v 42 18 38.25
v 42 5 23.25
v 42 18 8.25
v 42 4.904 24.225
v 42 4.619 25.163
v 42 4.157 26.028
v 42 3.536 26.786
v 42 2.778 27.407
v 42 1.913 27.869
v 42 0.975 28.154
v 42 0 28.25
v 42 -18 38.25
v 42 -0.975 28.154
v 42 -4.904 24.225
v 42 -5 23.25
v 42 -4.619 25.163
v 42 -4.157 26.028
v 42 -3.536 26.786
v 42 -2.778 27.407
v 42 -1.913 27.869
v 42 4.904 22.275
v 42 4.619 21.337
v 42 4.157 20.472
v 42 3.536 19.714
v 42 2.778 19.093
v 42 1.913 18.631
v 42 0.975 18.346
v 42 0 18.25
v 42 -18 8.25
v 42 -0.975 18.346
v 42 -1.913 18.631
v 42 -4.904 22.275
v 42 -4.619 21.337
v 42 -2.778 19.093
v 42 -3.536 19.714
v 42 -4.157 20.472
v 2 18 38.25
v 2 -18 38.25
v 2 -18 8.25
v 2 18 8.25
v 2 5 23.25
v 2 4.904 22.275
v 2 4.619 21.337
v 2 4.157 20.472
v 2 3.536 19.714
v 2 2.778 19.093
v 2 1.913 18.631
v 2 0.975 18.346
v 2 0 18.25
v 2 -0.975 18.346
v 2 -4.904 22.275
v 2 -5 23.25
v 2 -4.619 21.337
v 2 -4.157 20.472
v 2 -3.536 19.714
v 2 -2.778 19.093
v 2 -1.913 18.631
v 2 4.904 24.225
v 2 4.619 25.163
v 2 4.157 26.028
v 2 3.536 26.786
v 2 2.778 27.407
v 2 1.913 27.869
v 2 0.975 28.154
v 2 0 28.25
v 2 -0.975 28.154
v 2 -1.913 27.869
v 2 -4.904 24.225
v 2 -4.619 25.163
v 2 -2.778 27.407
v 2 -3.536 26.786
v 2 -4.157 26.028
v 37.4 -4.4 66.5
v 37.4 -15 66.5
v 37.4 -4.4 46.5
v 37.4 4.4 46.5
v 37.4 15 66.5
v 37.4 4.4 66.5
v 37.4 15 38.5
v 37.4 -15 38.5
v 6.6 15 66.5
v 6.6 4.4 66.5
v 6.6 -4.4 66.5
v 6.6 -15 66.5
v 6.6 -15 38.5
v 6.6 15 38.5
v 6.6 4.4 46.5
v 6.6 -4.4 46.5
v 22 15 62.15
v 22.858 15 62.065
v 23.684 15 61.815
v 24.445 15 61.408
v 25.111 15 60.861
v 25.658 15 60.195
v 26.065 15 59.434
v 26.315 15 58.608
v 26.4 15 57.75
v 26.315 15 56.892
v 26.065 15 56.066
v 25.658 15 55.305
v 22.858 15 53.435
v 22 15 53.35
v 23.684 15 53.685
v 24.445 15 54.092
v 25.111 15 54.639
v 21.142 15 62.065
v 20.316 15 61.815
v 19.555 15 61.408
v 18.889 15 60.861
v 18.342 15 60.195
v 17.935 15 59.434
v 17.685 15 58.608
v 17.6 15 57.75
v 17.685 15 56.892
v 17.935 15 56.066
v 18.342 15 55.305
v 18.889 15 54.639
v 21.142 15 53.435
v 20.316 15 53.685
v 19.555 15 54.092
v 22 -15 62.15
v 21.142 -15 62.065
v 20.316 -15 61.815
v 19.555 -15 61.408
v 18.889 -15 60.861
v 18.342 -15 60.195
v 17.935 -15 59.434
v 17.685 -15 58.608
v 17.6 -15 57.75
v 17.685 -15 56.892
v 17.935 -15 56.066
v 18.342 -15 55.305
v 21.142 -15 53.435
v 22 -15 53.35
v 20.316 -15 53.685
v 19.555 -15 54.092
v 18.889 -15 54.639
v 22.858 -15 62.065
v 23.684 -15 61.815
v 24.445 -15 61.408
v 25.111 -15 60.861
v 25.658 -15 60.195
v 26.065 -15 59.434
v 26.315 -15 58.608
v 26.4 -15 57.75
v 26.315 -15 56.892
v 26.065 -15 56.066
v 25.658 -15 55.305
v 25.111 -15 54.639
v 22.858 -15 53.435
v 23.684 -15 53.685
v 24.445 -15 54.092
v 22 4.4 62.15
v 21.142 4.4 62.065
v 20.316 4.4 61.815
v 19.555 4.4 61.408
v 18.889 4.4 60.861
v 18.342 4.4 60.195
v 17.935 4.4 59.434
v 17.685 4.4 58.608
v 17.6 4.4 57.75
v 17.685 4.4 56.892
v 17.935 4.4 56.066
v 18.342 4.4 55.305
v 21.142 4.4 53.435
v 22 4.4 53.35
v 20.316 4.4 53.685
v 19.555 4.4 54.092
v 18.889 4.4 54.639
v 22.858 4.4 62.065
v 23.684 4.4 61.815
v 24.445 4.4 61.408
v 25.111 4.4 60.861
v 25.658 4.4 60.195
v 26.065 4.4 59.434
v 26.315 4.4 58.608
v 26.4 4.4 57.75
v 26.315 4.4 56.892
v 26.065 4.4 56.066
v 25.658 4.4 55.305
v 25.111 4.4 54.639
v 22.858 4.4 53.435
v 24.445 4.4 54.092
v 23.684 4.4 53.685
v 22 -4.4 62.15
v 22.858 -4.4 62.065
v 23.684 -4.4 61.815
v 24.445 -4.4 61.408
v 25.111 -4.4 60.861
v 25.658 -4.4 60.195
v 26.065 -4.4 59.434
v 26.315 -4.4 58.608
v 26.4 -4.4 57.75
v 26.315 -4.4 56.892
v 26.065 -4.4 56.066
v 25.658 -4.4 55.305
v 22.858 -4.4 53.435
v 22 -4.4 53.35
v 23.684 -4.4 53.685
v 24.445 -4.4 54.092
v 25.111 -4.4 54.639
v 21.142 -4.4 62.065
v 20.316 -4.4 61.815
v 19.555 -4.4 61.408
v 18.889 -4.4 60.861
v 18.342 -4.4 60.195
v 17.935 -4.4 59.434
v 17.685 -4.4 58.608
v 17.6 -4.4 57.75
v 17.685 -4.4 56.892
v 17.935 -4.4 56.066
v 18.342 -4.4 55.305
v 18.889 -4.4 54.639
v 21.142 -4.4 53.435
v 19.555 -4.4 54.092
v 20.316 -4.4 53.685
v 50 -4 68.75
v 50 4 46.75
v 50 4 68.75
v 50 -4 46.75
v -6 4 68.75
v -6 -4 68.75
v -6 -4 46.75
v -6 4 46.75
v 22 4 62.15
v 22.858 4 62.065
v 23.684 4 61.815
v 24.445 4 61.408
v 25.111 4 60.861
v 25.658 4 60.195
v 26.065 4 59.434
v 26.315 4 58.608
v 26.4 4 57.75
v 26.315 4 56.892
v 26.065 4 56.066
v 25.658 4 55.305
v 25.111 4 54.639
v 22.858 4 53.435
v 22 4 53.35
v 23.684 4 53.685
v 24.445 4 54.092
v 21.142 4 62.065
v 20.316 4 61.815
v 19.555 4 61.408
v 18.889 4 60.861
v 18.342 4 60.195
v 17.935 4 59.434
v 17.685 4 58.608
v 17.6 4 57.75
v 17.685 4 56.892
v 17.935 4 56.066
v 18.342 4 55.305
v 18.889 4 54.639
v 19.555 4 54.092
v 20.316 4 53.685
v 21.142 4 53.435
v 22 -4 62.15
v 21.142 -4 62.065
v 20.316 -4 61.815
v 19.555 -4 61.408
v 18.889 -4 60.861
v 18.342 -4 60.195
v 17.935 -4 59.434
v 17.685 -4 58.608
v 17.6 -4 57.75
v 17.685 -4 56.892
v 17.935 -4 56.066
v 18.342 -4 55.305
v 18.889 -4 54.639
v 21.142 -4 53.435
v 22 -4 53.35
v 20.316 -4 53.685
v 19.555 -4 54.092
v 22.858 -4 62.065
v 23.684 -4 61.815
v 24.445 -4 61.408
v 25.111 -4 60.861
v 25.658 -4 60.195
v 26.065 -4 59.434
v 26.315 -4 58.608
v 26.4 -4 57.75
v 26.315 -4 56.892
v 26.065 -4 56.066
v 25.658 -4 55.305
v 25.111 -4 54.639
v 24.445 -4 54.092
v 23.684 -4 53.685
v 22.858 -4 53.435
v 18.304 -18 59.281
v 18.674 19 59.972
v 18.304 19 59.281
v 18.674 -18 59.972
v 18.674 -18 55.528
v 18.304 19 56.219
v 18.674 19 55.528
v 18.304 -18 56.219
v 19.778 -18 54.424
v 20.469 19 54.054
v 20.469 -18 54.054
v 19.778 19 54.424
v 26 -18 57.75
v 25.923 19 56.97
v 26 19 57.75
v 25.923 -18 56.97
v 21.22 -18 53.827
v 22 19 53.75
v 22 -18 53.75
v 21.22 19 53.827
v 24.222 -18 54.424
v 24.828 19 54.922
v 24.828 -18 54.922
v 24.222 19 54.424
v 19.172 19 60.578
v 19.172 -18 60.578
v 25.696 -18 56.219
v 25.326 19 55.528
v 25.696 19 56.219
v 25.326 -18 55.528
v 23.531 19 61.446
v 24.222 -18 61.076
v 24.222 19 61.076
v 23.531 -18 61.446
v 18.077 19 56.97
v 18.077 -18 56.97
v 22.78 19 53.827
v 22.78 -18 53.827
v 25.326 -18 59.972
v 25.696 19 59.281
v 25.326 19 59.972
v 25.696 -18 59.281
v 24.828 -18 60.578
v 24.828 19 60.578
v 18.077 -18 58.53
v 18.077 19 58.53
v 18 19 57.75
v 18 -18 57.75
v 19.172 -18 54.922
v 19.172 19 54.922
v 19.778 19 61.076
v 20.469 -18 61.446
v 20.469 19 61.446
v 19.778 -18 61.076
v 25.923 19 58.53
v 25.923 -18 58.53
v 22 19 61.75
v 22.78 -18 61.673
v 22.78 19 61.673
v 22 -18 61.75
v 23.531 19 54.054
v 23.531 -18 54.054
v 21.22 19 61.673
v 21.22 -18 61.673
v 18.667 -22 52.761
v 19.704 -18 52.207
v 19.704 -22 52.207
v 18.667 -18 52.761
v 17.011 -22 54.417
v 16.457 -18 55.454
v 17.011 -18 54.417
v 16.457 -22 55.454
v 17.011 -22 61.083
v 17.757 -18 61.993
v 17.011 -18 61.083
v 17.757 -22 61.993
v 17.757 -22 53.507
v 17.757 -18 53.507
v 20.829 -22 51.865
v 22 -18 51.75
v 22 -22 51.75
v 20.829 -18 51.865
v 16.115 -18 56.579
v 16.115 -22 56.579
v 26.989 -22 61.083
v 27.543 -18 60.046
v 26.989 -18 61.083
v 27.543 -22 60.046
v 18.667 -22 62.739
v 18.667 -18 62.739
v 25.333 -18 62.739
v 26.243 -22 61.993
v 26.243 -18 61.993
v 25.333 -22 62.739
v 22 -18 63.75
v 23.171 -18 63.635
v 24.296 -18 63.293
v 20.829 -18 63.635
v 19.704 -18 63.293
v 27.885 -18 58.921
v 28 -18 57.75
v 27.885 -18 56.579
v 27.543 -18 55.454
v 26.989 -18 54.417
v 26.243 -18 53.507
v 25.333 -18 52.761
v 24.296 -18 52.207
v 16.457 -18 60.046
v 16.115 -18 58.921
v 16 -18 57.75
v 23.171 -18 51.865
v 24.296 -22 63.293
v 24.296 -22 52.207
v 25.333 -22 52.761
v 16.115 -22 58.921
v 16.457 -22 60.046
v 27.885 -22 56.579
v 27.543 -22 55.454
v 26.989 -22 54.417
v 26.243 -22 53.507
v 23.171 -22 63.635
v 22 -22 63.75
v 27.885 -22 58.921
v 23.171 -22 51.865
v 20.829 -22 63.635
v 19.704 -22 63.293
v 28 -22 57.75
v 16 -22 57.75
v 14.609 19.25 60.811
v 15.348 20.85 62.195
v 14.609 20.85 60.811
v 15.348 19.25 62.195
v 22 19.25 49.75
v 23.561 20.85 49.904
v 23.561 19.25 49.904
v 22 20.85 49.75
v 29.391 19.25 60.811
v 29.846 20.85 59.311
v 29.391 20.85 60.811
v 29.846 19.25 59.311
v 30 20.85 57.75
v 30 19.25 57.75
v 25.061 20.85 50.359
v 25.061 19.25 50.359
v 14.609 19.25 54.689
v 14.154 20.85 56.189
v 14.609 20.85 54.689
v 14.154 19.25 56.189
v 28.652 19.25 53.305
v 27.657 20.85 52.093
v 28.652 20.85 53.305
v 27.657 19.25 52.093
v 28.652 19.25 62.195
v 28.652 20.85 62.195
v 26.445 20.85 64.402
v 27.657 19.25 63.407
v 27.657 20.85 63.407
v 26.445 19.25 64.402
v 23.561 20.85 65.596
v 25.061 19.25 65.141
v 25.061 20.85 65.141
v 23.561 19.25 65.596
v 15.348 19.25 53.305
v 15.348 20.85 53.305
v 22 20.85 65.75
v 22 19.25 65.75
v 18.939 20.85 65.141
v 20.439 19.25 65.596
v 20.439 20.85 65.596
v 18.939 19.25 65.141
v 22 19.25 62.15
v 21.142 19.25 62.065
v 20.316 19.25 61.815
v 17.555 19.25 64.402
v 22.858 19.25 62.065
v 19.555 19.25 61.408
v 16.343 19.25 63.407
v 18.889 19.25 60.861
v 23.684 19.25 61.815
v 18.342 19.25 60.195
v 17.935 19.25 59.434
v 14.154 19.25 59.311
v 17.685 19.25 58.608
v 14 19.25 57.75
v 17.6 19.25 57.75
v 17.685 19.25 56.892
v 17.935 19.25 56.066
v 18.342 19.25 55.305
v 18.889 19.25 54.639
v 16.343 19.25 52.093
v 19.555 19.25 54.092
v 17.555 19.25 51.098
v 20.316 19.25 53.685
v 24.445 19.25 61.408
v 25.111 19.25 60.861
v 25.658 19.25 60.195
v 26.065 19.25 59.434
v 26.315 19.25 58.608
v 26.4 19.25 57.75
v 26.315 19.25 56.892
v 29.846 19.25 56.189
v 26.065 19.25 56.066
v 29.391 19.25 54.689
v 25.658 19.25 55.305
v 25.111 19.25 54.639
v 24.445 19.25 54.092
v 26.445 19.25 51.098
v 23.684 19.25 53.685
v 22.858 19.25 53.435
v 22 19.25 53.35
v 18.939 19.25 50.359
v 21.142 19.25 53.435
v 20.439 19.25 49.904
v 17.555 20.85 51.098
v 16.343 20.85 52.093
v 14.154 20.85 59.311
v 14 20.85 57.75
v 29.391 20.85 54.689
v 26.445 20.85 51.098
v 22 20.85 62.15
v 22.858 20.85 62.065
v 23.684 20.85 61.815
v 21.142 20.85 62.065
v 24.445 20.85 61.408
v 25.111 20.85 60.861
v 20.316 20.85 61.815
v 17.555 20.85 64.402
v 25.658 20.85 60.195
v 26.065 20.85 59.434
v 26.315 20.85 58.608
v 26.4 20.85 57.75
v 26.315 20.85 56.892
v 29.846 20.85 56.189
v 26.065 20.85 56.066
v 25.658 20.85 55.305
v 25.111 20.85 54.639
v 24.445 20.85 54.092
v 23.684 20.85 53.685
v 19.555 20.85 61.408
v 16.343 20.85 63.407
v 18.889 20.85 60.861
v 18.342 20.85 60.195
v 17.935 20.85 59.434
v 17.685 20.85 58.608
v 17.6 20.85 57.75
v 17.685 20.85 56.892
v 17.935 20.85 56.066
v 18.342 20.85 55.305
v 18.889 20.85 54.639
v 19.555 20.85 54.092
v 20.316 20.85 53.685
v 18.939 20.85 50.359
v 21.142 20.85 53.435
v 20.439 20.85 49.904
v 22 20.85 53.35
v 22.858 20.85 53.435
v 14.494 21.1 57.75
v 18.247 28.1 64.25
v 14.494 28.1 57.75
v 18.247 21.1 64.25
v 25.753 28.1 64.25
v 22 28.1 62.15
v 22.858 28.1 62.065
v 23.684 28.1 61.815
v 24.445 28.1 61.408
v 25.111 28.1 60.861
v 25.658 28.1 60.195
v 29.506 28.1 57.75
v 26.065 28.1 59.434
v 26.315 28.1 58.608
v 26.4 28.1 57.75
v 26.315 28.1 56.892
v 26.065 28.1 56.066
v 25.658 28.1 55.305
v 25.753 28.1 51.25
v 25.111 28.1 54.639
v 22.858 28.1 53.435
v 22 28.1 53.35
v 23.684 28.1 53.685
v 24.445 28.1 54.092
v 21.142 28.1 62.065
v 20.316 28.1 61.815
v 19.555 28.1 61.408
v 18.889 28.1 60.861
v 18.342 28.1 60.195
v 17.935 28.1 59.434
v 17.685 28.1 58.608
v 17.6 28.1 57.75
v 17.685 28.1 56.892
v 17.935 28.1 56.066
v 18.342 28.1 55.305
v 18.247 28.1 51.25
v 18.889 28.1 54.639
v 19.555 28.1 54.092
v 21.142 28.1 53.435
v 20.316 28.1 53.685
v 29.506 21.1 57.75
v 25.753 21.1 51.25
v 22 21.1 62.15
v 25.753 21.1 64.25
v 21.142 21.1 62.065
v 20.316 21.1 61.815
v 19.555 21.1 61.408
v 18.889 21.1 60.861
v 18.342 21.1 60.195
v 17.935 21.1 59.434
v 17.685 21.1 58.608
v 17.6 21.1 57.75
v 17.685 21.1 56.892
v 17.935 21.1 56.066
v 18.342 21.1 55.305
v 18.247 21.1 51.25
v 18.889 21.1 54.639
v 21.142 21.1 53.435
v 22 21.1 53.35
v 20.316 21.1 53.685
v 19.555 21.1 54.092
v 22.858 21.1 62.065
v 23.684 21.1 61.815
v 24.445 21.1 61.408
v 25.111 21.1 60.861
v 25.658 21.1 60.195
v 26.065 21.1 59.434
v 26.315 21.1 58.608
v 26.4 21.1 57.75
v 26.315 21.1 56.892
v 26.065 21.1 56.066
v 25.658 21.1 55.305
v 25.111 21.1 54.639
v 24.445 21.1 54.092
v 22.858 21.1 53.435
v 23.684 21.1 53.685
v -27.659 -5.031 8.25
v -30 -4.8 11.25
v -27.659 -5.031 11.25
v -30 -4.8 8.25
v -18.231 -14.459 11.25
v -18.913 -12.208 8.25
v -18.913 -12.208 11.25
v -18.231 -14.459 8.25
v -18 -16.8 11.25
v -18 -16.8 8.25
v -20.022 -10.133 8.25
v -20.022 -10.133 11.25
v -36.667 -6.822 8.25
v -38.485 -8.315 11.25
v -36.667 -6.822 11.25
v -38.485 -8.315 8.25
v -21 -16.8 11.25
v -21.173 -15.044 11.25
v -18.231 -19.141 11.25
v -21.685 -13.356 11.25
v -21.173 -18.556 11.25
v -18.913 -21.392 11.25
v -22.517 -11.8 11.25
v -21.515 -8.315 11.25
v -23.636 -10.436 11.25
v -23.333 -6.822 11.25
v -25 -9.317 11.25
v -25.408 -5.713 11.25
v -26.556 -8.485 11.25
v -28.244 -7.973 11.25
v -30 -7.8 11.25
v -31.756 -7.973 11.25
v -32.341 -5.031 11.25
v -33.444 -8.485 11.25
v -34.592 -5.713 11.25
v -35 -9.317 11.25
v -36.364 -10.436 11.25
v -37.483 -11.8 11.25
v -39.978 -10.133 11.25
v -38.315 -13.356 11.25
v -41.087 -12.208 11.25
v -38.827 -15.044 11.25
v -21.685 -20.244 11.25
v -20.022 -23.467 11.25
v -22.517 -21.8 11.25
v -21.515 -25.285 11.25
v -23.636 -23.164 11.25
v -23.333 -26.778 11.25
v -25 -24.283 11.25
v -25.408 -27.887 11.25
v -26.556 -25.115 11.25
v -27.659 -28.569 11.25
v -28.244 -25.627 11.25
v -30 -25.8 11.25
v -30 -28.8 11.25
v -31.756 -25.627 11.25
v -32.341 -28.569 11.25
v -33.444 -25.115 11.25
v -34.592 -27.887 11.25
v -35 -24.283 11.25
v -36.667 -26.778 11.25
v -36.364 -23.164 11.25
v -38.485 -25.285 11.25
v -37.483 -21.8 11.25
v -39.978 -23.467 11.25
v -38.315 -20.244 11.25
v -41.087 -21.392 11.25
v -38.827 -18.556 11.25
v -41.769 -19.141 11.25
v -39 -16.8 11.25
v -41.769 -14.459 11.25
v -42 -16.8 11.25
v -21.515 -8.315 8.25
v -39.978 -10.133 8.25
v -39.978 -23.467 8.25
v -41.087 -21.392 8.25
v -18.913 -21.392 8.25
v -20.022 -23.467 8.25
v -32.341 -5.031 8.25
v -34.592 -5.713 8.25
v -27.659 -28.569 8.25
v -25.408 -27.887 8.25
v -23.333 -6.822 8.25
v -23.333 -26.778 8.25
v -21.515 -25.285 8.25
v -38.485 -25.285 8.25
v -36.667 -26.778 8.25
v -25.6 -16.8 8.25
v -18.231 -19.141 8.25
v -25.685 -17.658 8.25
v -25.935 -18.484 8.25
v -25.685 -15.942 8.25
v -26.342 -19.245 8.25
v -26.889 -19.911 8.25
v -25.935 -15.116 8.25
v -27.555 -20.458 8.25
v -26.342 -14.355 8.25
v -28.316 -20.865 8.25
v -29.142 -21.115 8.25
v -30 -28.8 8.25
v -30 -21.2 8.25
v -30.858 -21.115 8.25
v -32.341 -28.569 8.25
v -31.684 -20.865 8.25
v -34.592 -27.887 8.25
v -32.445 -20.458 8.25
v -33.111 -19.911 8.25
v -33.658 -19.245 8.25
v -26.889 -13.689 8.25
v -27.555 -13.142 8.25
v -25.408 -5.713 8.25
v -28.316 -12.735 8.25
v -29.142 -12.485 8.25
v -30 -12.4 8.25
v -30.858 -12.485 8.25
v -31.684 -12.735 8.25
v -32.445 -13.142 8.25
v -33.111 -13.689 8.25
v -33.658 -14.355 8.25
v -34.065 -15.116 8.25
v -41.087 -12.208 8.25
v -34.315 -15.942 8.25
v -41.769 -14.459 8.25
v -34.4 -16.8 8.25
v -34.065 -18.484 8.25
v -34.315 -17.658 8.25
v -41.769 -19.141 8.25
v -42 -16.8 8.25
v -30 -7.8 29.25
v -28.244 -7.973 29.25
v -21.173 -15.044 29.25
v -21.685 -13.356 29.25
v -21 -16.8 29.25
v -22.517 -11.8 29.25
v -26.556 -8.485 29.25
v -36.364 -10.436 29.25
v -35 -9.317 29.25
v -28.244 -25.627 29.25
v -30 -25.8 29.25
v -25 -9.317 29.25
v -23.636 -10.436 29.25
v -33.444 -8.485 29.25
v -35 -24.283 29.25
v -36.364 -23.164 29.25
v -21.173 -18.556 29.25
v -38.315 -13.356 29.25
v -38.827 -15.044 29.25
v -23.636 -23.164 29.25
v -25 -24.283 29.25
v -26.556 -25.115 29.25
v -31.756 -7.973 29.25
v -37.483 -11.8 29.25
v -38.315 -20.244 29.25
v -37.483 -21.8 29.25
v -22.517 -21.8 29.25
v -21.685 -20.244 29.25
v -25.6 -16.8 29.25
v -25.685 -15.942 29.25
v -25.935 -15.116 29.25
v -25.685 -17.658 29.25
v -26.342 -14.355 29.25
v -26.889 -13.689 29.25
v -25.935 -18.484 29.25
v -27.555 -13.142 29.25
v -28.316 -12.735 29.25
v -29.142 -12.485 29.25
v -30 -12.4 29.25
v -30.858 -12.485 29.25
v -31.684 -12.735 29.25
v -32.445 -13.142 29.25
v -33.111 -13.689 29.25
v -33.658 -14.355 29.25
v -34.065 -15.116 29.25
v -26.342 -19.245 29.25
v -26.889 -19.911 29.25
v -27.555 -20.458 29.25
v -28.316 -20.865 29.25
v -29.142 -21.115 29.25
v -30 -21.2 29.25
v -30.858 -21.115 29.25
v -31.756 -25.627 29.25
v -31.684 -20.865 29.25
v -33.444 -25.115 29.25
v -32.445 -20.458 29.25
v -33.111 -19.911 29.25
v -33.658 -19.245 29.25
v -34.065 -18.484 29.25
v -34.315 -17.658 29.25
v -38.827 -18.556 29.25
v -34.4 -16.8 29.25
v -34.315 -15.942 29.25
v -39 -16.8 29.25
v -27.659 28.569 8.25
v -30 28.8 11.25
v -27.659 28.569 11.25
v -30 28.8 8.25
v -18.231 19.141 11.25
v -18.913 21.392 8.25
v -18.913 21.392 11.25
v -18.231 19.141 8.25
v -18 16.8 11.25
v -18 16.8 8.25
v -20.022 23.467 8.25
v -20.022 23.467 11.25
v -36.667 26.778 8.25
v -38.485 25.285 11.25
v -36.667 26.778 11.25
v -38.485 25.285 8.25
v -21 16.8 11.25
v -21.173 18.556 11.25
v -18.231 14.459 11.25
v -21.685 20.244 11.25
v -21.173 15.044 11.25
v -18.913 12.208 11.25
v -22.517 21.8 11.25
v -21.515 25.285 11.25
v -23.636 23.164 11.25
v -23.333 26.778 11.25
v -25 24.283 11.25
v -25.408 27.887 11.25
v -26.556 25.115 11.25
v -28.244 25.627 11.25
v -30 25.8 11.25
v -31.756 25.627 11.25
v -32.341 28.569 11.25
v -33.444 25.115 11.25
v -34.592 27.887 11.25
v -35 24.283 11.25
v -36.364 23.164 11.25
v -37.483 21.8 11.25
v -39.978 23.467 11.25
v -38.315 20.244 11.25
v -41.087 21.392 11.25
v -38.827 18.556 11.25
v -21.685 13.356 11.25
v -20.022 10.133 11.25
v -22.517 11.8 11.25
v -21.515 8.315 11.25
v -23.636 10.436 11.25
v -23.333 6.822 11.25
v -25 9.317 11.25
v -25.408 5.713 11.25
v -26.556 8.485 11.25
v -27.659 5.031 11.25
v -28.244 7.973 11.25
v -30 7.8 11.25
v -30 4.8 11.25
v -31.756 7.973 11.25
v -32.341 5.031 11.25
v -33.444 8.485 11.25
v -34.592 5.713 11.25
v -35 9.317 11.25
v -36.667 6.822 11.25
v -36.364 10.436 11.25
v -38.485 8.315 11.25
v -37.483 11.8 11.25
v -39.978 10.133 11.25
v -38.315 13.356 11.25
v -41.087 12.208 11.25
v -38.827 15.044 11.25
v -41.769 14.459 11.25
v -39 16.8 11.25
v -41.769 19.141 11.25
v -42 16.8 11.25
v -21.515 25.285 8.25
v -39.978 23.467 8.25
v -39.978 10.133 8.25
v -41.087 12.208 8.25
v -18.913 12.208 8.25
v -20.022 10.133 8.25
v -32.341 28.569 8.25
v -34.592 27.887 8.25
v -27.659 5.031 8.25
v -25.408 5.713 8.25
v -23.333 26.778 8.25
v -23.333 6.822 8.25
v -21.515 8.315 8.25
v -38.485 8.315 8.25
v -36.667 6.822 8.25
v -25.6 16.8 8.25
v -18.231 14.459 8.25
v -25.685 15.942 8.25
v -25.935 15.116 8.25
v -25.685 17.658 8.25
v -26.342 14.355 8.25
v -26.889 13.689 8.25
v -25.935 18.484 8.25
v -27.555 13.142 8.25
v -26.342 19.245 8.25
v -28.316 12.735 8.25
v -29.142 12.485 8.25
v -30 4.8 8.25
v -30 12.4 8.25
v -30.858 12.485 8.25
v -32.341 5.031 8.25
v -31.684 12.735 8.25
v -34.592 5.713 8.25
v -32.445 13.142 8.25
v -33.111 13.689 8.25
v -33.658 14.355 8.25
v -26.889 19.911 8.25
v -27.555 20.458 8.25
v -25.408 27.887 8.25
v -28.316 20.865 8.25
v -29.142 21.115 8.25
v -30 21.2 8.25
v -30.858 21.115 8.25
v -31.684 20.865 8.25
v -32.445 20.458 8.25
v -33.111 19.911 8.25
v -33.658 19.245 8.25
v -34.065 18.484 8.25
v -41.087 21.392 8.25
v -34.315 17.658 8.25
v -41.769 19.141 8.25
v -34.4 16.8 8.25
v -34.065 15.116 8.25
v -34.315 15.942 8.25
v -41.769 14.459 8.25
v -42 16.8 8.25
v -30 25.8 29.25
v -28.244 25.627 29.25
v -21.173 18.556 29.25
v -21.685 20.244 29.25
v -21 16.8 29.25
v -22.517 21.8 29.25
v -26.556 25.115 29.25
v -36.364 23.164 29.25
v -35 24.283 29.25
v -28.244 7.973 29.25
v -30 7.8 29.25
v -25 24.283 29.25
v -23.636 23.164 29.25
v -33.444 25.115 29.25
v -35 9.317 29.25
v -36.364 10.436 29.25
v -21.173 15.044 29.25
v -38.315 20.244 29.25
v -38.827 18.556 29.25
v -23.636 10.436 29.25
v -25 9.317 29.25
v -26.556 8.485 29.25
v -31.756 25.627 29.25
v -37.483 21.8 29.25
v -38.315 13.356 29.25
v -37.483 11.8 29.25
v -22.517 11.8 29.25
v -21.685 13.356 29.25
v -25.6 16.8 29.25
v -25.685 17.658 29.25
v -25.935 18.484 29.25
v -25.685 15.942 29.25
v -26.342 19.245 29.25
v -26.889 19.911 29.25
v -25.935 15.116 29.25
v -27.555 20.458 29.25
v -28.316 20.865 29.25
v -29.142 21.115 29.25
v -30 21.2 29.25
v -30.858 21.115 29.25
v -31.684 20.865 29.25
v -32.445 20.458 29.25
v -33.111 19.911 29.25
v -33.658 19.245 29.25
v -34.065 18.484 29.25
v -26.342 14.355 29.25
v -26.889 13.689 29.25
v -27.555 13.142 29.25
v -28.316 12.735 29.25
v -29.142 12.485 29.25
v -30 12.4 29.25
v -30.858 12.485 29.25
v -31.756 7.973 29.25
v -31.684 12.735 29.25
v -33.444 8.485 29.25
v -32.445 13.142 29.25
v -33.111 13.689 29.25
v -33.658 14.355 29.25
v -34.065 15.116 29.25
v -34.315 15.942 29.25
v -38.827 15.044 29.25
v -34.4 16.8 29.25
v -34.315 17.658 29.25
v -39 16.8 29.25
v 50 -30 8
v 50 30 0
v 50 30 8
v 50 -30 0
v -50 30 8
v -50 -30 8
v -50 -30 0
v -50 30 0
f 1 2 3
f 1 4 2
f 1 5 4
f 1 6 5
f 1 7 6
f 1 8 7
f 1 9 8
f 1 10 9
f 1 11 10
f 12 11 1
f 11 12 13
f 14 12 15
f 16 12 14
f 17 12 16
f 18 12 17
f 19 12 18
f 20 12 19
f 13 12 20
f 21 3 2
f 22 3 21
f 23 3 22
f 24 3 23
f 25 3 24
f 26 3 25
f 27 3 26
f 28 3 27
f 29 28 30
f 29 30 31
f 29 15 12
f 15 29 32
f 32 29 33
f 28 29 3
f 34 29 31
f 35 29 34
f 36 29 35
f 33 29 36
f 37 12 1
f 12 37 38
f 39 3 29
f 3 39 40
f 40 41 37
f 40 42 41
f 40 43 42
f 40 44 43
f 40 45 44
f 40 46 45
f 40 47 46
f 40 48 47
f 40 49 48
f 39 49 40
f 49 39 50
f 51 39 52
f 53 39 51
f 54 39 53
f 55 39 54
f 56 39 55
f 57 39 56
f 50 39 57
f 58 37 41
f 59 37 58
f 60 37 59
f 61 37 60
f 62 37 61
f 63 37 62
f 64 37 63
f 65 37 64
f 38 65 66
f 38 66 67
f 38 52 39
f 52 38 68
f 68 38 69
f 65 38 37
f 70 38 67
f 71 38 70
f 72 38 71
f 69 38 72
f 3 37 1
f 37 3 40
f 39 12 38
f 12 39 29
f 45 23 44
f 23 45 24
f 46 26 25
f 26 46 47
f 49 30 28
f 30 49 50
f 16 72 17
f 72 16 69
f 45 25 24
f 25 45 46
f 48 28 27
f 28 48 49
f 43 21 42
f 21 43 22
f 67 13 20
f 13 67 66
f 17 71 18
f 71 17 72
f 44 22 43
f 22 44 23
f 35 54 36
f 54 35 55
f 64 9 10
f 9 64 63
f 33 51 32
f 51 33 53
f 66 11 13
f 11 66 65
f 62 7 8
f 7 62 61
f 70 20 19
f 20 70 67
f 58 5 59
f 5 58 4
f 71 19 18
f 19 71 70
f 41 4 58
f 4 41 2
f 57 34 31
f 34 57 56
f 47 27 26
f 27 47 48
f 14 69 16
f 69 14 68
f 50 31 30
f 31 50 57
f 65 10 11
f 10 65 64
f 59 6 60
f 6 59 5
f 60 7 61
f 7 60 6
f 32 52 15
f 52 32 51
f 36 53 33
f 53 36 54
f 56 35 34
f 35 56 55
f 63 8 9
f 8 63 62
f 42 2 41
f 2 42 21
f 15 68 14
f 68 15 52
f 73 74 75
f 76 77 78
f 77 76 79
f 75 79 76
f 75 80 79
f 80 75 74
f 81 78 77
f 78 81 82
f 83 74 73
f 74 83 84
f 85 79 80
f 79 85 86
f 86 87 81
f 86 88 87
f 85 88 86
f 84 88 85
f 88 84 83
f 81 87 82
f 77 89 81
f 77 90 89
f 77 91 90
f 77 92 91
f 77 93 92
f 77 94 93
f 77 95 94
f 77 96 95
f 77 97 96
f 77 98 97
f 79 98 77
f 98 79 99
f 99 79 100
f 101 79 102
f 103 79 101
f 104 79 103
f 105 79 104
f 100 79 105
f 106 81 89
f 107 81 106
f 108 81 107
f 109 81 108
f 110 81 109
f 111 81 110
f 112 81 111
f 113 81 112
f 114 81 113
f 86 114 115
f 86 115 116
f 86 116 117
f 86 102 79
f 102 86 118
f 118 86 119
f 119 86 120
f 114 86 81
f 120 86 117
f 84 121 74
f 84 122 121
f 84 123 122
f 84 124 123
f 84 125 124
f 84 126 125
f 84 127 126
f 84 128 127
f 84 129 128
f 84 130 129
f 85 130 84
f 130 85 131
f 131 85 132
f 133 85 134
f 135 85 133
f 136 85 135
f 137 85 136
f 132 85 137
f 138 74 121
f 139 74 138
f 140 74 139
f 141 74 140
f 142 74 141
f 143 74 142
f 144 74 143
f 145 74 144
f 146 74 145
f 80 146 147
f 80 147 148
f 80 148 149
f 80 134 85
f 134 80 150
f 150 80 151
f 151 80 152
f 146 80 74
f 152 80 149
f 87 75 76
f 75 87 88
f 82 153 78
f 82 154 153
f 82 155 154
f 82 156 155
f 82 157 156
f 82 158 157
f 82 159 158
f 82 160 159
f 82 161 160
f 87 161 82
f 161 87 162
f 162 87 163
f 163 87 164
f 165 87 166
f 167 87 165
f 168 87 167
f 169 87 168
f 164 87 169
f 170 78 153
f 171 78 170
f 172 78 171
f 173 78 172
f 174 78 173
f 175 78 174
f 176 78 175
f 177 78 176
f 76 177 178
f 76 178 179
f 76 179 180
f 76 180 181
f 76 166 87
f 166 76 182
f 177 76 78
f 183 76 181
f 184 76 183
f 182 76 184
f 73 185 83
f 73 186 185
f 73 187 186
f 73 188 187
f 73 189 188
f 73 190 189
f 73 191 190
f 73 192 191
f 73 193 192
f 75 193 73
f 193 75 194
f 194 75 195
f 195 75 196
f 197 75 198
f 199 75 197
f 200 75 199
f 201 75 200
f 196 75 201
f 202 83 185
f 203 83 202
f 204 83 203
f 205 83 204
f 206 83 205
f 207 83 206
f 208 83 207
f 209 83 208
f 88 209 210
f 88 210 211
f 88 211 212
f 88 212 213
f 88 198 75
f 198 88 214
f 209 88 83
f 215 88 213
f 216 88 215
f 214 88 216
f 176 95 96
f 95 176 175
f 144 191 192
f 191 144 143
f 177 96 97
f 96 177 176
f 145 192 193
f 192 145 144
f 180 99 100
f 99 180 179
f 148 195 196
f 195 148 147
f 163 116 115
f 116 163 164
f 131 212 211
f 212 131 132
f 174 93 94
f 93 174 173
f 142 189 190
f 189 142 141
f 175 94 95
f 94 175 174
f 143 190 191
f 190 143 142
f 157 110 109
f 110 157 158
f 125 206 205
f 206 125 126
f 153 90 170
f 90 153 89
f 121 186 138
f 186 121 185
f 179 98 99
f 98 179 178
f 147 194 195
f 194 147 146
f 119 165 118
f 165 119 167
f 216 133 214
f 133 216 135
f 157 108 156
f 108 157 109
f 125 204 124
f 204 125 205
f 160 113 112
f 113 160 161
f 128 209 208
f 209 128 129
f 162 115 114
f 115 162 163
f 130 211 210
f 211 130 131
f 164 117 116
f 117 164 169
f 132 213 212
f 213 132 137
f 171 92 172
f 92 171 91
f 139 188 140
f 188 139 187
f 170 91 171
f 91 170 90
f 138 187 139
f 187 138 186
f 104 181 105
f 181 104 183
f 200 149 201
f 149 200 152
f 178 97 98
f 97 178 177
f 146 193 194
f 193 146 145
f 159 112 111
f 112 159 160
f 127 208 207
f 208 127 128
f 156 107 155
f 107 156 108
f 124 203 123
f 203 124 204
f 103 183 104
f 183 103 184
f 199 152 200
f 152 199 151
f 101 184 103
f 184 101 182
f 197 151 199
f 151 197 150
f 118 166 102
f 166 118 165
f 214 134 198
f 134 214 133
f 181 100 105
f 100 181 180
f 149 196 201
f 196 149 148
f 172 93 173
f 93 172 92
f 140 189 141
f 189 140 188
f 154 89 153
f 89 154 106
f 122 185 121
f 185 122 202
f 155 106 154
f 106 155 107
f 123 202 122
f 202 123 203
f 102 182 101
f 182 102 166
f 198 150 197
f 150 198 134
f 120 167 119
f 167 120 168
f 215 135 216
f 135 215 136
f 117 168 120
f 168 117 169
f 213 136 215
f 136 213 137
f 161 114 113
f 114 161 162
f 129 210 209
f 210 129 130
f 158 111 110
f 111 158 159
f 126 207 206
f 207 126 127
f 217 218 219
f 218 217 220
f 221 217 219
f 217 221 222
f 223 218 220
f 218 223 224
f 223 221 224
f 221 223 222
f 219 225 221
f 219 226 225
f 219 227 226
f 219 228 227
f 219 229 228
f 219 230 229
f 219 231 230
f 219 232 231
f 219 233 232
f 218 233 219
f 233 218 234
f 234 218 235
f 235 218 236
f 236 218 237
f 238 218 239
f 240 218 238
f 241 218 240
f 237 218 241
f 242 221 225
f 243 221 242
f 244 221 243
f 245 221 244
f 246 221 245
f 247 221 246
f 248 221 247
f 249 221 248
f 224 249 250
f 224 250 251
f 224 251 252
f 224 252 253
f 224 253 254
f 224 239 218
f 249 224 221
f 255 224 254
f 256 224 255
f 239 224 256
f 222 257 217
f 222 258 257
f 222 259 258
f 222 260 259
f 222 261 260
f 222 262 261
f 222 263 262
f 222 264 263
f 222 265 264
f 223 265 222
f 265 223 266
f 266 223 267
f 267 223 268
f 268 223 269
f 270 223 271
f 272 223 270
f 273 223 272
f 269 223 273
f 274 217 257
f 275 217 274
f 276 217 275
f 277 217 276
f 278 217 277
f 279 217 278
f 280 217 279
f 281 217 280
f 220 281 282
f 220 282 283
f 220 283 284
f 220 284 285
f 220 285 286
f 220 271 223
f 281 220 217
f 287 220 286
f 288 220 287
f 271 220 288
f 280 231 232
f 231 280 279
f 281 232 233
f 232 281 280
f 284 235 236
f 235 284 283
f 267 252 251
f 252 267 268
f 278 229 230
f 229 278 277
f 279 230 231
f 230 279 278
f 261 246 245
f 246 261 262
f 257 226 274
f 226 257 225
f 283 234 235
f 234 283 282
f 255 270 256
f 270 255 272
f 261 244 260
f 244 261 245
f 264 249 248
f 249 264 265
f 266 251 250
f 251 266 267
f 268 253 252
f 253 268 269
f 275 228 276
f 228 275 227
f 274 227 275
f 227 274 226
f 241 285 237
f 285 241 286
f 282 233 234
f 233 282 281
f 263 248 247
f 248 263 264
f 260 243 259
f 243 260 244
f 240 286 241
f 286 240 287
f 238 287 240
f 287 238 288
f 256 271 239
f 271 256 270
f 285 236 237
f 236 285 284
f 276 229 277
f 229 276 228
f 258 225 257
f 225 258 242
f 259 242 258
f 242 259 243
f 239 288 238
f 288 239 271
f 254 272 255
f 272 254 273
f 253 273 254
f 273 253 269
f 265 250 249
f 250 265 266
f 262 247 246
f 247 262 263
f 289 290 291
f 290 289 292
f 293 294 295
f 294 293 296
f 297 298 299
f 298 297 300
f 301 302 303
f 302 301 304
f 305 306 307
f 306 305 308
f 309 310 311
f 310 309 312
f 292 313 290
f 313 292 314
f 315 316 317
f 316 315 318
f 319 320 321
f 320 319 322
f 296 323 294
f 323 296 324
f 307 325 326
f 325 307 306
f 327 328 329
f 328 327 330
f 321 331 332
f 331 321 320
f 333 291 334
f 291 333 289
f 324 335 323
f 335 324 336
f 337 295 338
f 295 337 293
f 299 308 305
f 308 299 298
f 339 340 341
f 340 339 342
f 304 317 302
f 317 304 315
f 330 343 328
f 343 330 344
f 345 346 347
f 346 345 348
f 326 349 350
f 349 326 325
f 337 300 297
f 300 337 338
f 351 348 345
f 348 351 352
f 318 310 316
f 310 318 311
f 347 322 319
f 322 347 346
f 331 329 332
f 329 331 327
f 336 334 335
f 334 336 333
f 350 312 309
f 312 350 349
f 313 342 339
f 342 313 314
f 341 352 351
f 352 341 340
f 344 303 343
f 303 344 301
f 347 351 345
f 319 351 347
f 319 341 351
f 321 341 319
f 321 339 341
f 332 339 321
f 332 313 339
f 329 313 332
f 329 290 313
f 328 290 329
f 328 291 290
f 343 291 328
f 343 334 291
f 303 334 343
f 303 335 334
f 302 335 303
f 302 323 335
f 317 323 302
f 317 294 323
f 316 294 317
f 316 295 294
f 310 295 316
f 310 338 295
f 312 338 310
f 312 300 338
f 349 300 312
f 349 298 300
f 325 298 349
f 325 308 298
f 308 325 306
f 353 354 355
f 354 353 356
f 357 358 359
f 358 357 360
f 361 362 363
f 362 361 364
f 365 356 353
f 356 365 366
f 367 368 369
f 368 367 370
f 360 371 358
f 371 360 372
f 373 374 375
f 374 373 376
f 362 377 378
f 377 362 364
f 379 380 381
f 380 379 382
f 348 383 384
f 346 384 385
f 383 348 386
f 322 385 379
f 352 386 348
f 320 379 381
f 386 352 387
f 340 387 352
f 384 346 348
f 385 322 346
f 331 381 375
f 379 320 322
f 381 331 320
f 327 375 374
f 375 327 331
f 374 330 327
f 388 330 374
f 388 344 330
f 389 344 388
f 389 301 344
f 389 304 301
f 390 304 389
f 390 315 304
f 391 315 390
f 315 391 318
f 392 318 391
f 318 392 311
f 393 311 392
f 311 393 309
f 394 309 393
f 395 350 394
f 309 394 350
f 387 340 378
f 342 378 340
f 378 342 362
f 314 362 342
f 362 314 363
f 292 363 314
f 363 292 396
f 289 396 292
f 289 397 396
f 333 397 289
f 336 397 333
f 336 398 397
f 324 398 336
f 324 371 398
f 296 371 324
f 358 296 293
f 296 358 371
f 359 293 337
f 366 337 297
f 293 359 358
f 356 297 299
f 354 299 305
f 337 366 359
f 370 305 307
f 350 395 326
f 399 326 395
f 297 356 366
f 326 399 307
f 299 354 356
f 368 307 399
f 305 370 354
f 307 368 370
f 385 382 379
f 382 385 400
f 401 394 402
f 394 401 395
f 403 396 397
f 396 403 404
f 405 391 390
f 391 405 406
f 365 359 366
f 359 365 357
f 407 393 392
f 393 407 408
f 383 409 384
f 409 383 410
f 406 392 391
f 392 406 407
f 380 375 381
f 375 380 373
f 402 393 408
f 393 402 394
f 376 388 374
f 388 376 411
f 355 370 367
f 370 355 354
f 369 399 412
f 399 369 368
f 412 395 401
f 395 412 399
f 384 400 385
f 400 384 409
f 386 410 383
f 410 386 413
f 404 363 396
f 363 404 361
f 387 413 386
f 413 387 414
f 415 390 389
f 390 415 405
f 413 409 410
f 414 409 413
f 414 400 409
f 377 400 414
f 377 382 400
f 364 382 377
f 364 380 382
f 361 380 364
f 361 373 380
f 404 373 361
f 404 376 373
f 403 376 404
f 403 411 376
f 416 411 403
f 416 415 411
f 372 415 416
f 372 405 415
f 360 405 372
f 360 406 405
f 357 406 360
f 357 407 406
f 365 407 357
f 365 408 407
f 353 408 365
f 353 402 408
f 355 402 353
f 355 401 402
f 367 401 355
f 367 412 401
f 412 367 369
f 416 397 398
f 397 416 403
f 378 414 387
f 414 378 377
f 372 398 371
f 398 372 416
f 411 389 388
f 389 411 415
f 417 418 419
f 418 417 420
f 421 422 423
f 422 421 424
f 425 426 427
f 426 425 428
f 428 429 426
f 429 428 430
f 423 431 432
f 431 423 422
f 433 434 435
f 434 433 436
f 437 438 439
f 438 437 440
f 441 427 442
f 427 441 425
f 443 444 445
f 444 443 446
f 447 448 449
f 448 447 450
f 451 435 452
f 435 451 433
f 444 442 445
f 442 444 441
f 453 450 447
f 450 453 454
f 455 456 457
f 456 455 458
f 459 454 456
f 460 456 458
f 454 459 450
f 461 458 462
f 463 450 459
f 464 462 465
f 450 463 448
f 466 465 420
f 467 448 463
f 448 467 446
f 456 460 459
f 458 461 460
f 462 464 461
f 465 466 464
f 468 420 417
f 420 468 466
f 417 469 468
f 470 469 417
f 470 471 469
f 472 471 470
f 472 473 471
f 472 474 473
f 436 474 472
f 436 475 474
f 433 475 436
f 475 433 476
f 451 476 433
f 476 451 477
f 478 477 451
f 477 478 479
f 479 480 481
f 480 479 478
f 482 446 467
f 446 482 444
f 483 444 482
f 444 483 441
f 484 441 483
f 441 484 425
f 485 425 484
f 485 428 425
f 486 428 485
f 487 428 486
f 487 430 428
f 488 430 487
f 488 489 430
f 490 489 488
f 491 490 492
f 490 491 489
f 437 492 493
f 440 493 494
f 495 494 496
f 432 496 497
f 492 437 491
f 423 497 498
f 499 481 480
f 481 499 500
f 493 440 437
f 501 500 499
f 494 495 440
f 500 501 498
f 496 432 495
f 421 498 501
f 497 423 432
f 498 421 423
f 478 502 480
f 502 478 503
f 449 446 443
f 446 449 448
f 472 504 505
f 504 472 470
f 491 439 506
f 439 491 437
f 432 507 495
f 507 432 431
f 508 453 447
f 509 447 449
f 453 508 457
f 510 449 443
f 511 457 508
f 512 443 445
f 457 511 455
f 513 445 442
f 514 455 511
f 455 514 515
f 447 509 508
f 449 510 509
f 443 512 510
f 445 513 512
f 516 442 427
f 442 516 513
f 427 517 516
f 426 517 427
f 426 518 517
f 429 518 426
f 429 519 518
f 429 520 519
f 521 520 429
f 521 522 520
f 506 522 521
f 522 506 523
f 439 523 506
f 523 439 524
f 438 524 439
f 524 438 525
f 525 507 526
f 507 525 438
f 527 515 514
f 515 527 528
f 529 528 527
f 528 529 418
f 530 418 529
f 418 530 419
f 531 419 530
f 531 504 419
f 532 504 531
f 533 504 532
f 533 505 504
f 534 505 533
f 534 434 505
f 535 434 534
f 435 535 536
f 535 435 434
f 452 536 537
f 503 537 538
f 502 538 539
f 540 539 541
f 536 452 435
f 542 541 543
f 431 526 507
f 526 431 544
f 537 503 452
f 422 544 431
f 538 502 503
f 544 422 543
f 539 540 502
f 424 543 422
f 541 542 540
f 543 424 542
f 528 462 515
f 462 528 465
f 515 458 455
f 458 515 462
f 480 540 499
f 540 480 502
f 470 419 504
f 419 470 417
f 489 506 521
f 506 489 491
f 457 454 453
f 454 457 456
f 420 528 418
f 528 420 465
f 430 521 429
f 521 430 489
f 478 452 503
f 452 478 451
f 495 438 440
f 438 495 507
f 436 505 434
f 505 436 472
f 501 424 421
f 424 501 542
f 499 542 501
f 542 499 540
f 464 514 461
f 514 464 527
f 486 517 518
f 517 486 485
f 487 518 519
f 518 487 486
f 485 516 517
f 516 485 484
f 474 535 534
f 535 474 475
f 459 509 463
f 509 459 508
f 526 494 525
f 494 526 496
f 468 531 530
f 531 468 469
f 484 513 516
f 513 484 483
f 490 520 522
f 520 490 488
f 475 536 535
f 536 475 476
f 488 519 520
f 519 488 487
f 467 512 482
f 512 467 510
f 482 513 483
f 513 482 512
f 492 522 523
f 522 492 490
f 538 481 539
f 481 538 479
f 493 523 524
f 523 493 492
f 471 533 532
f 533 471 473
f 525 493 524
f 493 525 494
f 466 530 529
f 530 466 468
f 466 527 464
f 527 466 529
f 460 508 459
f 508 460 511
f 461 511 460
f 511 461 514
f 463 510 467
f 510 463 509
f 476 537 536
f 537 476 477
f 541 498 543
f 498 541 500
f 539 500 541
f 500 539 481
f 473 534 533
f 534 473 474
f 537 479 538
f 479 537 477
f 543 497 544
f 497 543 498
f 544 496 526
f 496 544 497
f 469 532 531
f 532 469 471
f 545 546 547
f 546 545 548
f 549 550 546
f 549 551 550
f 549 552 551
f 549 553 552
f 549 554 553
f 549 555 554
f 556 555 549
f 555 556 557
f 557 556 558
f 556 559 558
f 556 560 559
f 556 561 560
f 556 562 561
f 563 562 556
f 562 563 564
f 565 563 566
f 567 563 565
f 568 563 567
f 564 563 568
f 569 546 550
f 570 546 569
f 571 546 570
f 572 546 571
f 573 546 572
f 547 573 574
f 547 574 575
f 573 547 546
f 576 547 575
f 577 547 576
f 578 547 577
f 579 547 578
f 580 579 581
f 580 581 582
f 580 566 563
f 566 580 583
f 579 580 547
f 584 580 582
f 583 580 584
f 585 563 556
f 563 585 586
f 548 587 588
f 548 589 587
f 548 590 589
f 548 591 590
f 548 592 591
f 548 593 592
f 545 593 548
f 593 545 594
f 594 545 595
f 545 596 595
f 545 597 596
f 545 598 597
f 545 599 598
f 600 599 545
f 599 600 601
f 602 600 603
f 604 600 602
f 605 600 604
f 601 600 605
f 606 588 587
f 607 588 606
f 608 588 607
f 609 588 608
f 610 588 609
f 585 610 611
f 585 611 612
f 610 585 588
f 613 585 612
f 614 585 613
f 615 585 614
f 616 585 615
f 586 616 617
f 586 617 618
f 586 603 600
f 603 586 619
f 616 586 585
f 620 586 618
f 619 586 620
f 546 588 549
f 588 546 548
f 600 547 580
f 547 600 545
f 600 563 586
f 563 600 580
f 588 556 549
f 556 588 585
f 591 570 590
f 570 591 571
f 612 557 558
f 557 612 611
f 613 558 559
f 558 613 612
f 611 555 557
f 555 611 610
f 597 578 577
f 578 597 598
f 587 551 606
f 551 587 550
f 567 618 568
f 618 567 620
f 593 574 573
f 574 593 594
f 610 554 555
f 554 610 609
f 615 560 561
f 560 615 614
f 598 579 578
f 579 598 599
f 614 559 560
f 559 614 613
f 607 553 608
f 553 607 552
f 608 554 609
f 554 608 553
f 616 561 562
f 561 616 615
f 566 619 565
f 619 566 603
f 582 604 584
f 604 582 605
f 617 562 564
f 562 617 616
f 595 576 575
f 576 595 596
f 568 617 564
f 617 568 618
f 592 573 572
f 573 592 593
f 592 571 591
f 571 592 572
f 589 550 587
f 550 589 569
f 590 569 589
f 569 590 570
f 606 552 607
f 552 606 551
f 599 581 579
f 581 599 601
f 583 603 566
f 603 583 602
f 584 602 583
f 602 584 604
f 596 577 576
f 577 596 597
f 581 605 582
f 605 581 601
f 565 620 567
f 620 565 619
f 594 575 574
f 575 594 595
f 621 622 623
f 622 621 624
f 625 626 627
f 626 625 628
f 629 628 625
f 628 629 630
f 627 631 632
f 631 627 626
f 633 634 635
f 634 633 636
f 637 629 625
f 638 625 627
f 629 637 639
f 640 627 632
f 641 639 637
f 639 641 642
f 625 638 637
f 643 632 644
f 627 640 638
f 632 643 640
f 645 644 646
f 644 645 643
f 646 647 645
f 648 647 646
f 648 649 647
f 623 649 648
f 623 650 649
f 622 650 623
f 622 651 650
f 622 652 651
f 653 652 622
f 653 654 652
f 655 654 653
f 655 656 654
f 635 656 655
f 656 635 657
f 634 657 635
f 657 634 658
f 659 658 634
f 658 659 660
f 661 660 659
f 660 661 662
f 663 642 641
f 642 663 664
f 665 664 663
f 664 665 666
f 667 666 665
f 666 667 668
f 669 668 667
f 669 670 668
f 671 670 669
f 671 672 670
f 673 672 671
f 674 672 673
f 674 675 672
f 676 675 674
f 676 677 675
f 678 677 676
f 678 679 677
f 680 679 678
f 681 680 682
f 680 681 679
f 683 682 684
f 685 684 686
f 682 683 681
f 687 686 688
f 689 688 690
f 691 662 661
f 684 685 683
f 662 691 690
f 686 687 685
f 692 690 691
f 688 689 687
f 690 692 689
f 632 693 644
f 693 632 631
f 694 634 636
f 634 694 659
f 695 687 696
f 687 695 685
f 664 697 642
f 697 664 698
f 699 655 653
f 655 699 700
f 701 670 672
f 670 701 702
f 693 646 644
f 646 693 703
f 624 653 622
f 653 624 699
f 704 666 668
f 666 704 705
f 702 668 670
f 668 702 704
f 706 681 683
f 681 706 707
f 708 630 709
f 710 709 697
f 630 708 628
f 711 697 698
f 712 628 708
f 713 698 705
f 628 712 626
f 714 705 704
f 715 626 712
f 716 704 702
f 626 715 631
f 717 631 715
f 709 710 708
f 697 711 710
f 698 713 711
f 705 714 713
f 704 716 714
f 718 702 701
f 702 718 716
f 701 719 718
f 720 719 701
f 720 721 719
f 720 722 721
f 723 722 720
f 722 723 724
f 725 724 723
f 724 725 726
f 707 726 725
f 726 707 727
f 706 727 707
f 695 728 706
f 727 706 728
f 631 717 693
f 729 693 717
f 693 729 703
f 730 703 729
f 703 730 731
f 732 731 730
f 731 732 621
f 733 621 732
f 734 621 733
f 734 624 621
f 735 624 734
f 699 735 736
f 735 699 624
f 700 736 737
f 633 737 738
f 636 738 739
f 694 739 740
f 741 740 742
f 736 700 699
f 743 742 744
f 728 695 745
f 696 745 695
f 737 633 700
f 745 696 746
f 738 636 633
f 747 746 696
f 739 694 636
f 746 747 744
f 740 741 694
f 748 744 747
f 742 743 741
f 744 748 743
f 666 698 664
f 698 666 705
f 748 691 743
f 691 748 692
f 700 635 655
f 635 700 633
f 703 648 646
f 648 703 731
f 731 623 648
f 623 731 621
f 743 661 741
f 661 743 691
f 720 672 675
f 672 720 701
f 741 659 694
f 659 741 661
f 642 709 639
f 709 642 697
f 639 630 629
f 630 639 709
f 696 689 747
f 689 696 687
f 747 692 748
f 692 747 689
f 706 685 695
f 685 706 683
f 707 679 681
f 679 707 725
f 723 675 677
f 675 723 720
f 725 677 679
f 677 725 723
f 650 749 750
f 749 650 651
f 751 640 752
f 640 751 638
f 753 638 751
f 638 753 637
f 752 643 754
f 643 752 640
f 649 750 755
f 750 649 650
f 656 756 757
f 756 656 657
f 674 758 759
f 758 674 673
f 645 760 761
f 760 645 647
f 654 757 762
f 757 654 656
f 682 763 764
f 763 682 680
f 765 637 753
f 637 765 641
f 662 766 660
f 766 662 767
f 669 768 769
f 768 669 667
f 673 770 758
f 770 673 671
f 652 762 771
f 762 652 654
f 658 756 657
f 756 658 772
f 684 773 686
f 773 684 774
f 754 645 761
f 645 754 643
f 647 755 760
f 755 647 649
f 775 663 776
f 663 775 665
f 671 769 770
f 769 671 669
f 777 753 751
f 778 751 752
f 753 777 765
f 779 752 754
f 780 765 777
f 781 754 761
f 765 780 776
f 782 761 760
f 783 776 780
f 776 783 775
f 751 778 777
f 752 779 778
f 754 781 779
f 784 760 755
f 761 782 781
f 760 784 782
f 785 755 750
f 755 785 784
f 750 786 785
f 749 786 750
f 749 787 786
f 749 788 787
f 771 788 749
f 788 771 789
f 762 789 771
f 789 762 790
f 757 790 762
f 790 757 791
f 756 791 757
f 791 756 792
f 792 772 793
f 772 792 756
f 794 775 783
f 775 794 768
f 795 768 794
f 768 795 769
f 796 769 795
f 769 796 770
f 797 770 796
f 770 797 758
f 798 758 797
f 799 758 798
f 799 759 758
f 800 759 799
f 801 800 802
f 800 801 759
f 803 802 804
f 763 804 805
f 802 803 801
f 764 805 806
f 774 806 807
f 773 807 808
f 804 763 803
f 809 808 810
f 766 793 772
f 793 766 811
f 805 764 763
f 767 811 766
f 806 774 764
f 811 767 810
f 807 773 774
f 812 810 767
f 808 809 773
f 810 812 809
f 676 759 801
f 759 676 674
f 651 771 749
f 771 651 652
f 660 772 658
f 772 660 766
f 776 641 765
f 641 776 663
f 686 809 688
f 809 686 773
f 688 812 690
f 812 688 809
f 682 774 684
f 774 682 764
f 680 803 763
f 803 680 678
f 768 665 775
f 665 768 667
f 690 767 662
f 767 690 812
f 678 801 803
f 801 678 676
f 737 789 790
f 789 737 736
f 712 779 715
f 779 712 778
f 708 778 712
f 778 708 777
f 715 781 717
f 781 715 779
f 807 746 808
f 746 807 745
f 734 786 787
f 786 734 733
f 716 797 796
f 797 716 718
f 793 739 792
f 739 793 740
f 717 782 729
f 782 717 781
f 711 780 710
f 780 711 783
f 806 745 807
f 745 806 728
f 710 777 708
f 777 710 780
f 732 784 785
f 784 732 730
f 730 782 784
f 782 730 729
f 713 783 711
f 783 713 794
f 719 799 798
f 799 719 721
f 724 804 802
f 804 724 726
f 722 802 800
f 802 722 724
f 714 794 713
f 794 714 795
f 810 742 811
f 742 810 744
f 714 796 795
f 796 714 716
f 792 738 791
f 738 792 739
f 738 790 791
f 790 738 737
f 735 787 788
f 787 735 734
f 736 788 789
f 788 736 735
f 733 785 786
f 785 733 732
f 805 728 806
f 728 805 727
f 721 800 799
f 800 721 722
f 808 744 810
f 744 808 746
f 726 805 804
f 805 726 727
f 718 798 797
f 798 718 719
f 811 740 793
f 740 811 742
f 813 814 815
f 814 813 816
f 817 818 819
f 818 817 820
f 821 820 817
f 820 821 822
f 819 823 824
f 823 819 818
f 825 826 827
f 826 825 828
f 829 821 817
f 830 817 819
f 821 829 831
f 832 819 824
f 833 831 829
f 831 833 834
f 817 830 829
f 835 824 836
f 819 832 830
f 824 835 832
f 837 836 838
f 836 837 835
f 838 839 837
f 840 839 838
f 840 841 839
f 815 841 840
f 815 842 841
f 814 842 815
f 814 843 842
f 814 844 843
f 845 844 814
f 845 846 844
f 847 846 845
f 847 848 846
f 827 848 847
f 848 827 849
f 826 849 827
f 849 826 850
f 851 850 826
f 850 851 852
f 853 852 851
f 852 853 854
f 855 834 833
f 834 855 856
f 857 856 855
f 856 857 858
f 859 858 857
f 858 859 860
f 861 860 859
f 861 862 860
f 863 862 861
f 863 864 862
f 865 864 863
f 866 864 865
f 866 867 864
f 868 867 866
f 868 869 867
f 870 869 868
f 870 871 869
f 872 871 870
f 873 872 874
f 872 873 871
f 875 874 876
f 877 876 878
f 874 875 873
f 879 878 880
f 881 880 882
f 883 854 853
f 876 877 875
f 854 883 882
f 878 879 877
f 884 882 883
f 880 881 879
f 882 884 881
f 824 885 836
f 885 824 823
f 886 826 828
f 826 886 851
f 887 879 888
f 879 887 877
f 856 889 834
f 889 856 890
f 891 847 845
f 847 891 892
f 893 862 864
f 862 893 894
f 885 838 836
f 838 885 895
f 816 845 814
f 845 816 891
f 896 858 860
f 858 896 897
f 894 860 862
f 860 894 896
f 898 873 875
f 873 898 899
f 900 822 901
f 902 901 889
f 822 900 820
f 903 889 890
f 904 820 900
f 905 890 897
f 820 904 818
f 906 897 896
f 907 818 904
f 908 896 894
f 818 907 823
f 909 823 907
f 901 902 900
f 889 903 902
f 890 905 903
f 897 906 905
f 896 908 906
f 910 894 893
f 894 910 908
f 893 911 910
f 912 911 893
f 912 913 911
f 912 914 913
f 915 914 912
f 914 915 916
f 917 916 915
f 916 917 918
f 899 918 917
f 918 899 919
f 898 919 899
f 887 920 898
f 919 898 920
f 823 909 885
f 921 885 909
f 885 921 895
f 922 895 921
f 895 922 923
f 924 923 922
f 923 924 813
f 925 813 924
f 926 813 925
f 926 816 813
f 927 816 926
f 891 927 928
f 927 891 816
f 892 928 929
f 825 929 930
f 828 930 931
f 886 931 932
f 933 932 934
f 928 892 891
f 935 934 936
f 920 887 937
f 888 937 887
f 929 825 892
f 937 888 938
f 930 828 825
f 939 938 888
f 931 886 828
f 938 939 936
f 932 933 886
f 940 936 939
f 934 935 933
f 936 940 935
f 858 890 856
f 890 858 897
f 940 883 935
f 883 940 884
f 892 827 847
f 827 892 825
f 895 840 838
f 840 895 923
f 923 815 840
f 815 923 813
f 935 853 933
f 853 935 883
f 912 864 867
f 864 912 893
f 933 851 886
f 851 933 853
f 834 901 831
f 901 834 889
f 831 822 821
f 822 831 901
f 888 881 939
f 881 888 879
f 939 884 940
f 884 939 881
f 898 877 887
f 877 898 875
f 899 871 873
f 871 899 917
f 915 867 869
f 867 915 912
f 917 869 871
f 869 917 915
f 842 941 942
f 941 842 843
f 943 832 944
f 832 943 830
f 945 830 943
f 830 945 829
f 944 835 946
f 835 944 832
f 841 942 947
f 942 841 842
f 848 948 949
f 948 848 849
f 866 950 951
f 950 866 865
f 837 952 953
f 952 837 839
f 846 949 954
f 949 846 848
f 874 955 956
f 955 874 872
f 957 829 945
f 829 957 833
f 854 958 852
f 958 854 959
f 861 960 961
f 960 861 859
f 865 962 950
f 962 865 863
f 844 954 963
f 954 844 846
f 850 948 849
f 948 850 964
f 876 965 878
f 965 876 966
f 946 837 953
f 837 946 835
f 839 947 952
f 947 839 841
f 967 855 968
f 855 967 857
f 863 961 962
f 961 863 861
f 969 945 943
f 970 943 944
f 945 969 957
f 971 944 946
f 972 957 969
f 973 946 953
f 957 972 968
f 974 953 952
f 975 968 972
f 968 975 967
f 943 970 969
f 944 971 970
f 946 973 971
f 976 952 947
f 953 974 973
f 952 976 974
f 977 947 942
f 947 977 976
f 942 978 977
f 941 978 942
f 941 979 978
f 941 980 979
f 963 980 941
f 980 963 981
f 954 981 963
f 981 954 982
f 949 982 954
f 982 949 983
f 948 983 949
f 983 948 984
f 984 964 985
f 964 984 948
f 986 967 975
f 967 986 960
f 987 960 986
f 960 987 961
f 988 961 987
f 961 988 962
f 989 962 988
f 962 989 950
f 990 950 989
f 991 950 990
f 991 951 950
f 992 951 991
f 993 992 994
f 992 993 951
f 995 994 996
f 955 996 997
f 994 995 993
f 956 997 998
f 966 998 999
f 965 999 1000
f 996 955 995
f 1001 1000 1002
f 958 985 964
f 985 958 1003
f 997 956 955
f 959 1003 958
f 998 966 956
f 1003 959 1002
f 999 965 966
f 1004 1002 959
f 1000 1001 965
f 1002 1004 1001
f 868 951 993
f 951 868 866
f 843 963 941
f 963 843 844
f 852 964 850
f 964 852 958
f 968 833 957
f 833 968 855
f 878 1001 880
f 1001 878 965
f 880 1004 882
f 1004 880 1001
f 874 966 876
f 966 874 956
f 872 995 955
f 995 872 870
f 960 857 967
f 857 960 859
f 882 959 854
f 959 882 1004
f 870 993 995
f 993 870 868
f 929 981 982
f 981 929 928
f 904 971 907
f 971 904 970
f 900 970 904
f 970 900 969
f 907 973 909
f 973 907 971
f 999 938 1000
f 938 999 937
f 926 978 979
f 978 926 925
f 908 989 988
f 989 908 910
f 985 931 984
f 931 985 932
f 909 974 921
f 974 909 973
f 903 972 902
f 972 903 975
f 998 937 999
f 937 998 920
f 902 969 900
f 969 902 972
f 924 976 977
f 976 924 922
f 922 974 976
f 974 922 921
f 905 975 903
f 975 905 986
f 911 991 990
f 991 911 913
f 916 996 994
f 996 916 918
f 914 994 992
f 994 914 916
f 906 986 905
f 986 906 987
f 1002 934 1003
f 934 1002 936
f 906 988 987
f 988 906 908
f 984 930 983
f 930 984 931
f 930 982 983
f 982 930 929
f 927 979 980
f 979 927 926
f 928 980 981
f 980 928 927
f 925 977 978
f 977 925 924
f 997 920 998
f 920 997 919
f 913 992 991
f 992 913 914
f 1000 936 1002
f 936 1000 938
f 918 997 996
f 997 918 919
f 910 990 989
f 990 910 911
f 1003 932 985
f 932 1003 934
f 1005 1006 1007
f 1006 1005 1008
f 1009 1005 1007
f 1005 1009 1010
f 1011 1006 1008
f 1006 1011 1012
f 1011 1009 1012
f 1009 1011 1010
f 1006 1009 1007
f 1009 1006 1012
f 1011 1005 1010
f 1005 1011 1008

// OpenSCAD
$fn = 32;

// ------------------------------------------------------------------------
// Indexing jig: plate 100 x 60 mm, pin d8
// Every part is its own module, assembly() places every instance.
// ------------------------------------------------------------------------

// --- part 1 ---
module jig_plate() {
  difference() {
    translate([-50, -30, 0]) cube([100, 60, 8]);
  }
}

// --- part 2 ---
module locator_block() {
  difference() {
    translate([-20, -18, 0]) cube([40, 36, 30]);
    translate([0, 0, 15]) rotate([0, 90, 0]) cylinder(h = 42, d = 10, center = true);
  }
}

// --- part 3 ---
module index_fork() {
  difference() {
    translate([-15.4, -15, 0]) cube([30.8, 30, 28]);
    translate([-16.4, -4.4, 8]) cube([32.8, 8.8, 21]);
    translate([0, 0, 19.25]) rotate([90, 0, 0]) cylinder(h = 32, d = 8.8, center = true);
  }
}

// --- part 4 ---
module index_arm() {
  difference() {
    translate([-28, -4, 0]) cube([56, 8, 22]);
    translate([0, 0, 11]) rotate([90, 0, 0]) cylinder(h = 10, d = 8.8, center = true);
  }
}

// --- part 5 ---
module index_pin() {
  rotate([0, 90, 0]) cylinder(h = 38, d = 8, center = true);
  translate([-22, 0, 0]) rotate([0, 90, 0]) cylinder(h = 4, d = 12);
}

// --- part 6 ---
module pin_washer() {
  difference() {
      translate([0, 0, 0]) cylinder(h = 1.6, d = 16);
      translate([0, 0, -1]) cylinder(h = 3.6, d = 8.8);
    }
}

// --- part 7 ---
module lock_nut() {
  difference() {
    linear_extrude(height = 7) polygon(points = [[7.506, 0], [3.753, 6.5], [-3.753, 6.5], [-7.506, 0], [-3.753, -6.5], [3.753, -6.5]]);
    translate([0, 0, -1]) cylinder(h = 9, d = 8.8);
  }
}

// --- part 8 ---
module guide_bush_a() {
  difference() {
    union() {
      cylinder(h = 3, d = 24);
      translate([0, 0, 3]) cylinder(h = 18, d = 18);
    }
    translate([0, 0, -1]) cylinder(h = 23, d = 8.8);
  }
}

// --- part 9 ---
module guide_bush_b() {
  difference() {
    union() {
      cylinder(h = 3, d = 24);
      translate([0, 0, 3]) cylinder(h = 18, d = 18);
    }
    translate([0, 0, -1]) cylinder(h = 23, d = 8.8);
  }
}

// --- assembly ---
module assembly() {
  color([0.80, 0.24, 0.20]) translate([0, 0, 0]) rotate([0, 0, 0]) jig_plate();
  color([0.20, 0.45, 0.75]) translate([22, 0, 8.25]) rotate([0, 0, 0]) locator_block();
  color([0.25, 0.62, 0.32]) translate([22, 0, 38.5]) rotate([0, 0, 0]) index_fork();
  color([0.92, 0.70, 0.18]) translate([22, 0, 46.75]) rotate([0, 0, 0]) index_arm();
  color([0.58, 0.35, 0.70]) translate([22, 0, 57.75]) rotate([0, 0, 90]) index_pin();
  color([0.16, 0.66, 0.66]) translate([22, 20.85, 57.75]) rotate([90, 0, 0]) pin_washer();
  color([0.85, 0.48, 0.18]) translate([22, 28.1, 57.75]) rotate([90, 0, 0]) lock_nut();
  color([0.55, 0.60, 0.65]) translate([-30, -16.8, 8.25]) rotate([0, 0, 0]) guide_bush_a();
  color([0.75, 0.30, 0.55]) translate([-30, 16.8, 8.25]) rotate([0, 0, 0]) guide_bush_b();
}

assembly();
